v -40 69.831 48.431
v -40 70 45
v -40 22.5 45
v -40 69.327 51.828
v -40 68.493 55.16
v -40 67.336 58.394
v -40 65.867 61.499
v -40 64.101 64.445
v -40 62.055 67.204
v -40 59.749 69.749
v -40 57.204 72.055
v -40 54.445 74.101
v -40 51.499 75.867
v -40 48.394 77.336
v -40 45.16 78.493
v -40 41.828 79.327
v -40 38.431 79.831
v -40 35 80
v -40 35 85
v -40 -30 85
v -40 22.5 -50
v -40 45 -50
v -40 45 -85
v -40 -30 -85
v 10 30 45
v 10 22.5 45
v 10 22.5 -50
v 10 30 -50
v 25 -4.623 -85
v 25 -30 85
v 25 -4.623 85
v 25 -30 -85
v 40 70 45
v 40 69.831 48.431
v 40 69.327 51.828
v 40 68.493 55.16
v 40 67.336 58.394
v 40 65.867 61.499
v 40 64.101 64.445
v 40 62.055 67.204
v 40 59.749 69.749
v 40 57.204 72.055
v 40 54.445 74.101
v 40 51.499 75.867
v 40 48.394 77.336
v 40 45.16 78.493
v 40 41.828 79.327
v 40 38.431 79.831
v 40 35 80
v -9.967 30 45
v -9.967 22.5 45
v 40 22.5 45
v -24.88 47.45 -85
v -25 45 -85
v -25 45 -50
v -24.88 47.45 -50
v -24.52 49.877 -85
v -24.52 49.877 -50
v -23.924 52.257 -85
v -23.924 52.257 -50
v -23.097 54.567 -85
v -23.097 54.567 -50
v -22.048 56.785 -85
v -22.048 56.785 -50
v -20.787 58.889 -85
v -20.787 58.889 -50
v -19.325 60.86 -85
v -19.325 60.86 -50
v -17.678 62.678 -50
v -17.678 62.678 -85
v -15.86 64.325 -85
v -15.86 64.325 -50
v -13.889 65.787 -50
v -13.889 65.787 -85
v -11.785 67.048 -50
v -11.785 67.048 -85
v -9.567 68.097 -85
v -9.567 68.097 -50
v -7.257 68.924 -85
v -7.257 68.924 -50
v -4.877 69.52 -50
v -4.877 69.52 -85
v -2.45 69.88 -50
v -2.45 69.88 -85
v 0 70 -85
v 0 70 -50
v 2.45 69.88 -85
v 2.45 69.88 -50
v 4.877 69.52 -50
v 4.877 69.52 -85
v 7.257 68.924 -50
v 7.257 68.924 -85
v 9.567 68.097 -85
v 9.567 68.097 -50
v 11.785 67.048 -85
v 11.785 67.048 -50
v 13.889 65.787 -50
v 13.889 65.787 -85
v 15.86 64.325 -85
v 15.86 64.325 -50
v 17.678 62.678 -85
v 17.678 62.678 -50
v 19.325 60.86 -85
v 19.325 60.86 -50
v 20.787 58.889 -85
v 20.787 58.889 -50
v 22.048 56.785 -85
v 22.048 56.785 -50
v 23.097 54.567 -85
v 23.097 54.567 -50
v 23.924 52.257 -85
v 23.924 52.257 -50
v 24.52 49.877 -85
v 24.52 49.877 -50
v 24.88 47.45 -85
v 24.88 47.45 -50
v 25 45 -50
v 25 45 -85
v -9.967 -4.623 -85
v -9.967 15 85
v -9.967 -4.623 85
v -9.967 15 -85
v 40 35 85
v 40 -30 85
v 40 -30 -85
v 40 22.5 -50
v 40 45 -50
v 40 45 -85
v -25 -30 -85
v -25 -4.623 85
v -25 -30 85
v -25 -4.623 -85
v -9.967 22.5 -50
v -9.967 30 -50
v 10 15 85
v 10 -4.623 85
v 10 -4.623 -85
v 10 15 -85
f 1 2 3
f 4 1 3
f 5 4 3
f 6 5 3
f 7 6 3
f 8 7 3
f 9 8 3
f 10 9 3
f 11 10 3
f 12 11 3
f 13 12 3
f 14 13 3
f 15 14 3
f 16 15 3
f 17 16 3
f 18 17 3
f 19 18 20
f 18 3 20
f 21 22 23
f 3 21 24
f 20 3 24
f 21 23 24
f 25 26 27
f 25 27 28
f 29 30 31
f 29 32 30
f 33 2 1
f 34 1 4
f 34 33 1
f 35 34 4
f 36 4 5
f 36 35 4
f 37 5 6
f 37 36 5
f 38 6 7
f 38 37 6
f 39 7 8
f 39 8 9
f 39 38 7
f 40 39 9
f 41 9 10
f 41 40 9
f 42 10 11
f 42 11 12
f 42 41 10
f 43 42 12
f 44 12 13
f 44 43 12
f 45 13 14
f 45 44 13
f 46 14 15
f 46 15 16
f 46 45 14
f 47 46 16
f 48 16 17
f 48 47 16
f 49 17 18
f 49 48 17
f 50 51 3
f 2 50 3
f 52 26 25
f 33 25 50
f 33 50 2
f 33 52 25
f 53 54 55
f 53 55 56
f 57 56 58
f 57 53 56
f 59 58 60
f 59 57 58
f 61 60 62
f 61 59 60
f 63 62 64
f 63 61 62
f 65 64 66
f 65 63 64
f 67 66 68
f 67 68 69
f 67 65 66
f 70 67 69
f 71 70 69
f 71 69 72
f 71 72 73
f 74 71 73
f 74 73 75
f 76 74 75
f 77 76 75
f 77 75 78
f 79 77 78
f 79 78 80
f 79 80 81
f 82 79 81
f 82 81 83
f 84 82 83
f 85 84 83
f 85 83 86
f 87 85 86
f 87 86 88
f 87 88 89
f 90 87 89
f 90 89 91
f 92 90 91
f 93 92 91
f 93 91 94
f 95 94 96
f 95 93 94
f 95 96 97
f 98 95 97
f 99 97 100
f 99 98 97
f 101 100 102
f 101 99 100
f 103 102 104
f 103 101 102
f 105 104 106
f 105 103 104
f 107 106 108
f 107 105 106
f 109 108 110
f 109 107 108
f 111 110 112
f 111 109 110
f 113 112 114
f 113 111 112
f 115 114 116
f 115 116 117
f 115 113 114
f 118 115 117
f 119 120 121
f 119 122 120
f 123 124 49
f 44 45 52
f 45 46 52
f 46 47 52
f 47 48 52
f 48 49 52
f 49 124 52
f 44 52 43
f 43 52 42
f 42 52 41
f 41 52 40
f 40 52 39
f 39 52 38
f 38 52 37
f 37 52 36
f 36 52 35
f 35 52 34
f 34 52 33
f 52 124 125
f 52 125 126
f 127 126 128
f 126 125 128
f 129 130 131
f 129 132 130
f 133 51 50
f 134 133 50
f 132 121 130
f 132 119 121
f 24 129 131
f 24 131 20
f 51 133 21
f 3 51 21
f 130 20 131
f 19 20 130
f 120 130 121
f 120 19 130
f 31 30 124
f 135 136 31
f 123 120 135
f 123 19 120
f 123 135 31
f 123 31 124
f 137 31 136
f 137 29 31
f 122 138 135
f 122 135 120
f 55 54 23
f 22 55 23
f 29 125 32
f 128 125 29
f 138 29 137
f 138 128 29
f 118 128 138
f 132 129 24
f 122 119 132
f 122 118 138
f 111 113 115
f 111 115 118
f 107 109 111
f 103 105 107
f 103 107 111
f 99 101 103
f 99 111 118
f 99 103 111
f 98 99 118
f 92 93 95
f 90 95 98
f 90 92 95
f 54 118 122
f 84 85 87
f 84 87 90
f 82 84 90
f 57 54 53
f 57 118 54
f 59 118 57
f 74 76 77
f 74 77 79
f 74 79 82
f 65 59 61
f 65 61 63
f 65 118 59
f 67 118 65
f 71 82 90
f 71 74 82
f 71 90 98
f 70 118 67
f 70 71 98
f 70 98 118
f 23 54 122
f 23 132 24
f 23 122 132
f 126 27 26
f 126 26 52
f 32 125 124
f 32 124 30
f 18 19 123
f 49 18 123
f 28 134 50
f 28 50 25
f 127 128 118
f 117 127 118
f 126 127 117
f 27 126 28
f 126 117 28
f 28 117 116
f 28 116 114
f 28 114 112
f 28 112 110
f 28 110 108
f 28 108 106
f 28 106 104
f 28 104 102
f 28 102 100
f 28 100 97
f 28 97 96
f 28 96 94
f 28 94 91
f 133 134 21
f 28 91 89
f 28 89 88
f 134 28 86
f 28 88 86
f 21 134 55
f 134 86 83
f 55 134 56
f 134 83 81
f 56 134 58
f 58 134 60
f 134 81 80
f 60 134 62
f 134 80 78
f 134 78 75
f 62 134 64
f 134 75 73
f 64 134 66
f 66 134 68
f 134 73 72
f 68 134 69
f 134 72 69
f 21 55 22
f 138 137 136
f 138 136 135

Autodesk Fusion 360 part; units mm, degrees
sketch "Sketch1" plane through (0, 0, 0) normal (0, 0, 1) x (1, 0, 0)
  line L0 (-40, -30) -> (-40, 22.5)
  line L1 (-9.9671, 30) -> (10, 30)
  line L2 (40, 22.5) -> (40, -30)
  line L3 (25, -30) -> (25, -4.623)
  line L4 (-25, -4.623) -> (-25, -30)
  line L5 (40, -30) -> (25, -30)
  line L6 (-25, -30) -> (-40, -30)
  line L7 (10, -4.623) -> (10, 15)
  line L8 (10, 15) -> (-9.9671, 15)
  line L9 (-9.9671, 15) -> (-9.9671, -4.623)
  line L10 (10, 22.5) -> (10, 30)
  line L11 (-9.9671, 22.5) -> (-9.9671, 30)
  line L12 (10, 22.5) -> (40, 22.5)
  line L13 (-9.9671, 22.5) -> (-40, 22.5)
  line L14 (25, -4.623) -> (10, -4.623)
  line L15 (-9.9671, -4.623) -> (-25, -4.623)
extrude "Extrude1" add sketch "Sketch1" along normal mid plane 170
sketch "Sketch2" plane through (0, 0, 85) normal (0, 0, 1) x (1, 0, 0)
  line L0 (10, 22.5) -> (10, 30)
  line L1 (10, 30) -> (-9.9671, 30)
  line L2 (-9.9671, 30) -> (-9.9671, 22.5)
  line L3 (-9.9671, 22.5) -> (-40, 22.5)
  line L4 (-40, 22.5) -> (-40, -30)
  line L5 (-40, -30) -> (-25, -30)
  line L6 (-25, -30) -> (-25, -4.623)
  line L7 (-25, -4.623) -> (-9.9671, -4.623)
  line L8 (-9.9671, -4.623) -> (-9.9671, 15)
  line L9 (-9.9671, 15) -> (10, 15)
  line L10 (10, 15) -> (10, -4.623)
  line L11 (10, -4.623) -> (25, -4.623)
  line L12 (25, -4.623) -> (25, -30)
  line L13 (25, -30) -> (40, -30)
  line L14 (40, -30) -> (40, 22.5)
  line L15 (40, 22.5) -> (10, 22.5)
  line L16 (-40, 22.5) -> (-40, 35)
  line L17 (-40, 35) -> (40, 35)
  line L18 (40, 35) -> (40, 22.5)
extrude "Extrude2" add sketch "Sketch2" against normal blind 40 contours L0 L1 L2 L3 L15 L16 L17 L18
sketch "Sketch3" plane through (40, 0, 0) normal (1, 0, 0) x (0, 0, -1)
  line L0 (85, 22.5) -> (-45, 22.5)
  line L1 (-45, 22.5) -> (-45, 35)
  line L2 (-45, 35) -> (-85, 35)
  line L3 (-85, 35) -> (-85, -30)
  line L4 (-85, -30) -> (85, -30)
  line L5 (85, -30) -> (85, 22.5)
  line L6 (-45, 35) -> (-45, 70)
  arc A0 (-45, 70) -> (-80, 35) centre (-45, 35) ccw
extrude "Extrude3" add sketch "Sketch3" against normal up to surface (80 mm away) contours L2 L6 A0
sketch "Sketch4" plane through (0, 0, -85) normal (0, 0, -1) x (-1, 0, 0)
  line L0 (-10, 30) -> (-10, 22.5)
  line L1 (-10, 22.5) -> (-40, 22.5)
  line L2 (-40, 22.5) -> (-40, -30)
  line L3 (-40, -30) -> (-25, -30)
  line L4 (-25, -30) -> (-25, -4.623)
  line L5 (-25, -4.623) -> (-10, -4.623)
  line L6 (-10, -4.623) -> (-10, 15)
  line L7 (-10, 15) -> (9.9671, 15)
  line L8 (9.9671, 15) -> (9.9671, -4.623)
  line L9 (9.9671, -4.623) -> (25, -4.623)
  line L10 (25, -4.623) -> (25, -30)
  line L11 (25, -30) -> (40, -30)
  line L12 (40, -30) -> (40, 22.5)
  line L13 (40, 22.5) -> (9.9671, 22.5)
  line L14 (9.9671, 22.5) -> (9.9671, 30)
  line L15 (9.9671, 30) -> (-10, 30)
  line L16 (-40, 22.5) -> (-40, 45)
  line L17 (40, 45) -> (40, 22.5)
  arc A0 (25, 45) -> (-25, 45) centre (0, 45) ccw
  line L18 (-40, 45) -> (-25, 45)
  line L19 (25, 45) -> (40, 45)
extrude "Extrude4" add sketch "Sketch4" against normal blind 35 contours L0 L1 L13 L14 L15 L16 L17 A0 L18 L19
